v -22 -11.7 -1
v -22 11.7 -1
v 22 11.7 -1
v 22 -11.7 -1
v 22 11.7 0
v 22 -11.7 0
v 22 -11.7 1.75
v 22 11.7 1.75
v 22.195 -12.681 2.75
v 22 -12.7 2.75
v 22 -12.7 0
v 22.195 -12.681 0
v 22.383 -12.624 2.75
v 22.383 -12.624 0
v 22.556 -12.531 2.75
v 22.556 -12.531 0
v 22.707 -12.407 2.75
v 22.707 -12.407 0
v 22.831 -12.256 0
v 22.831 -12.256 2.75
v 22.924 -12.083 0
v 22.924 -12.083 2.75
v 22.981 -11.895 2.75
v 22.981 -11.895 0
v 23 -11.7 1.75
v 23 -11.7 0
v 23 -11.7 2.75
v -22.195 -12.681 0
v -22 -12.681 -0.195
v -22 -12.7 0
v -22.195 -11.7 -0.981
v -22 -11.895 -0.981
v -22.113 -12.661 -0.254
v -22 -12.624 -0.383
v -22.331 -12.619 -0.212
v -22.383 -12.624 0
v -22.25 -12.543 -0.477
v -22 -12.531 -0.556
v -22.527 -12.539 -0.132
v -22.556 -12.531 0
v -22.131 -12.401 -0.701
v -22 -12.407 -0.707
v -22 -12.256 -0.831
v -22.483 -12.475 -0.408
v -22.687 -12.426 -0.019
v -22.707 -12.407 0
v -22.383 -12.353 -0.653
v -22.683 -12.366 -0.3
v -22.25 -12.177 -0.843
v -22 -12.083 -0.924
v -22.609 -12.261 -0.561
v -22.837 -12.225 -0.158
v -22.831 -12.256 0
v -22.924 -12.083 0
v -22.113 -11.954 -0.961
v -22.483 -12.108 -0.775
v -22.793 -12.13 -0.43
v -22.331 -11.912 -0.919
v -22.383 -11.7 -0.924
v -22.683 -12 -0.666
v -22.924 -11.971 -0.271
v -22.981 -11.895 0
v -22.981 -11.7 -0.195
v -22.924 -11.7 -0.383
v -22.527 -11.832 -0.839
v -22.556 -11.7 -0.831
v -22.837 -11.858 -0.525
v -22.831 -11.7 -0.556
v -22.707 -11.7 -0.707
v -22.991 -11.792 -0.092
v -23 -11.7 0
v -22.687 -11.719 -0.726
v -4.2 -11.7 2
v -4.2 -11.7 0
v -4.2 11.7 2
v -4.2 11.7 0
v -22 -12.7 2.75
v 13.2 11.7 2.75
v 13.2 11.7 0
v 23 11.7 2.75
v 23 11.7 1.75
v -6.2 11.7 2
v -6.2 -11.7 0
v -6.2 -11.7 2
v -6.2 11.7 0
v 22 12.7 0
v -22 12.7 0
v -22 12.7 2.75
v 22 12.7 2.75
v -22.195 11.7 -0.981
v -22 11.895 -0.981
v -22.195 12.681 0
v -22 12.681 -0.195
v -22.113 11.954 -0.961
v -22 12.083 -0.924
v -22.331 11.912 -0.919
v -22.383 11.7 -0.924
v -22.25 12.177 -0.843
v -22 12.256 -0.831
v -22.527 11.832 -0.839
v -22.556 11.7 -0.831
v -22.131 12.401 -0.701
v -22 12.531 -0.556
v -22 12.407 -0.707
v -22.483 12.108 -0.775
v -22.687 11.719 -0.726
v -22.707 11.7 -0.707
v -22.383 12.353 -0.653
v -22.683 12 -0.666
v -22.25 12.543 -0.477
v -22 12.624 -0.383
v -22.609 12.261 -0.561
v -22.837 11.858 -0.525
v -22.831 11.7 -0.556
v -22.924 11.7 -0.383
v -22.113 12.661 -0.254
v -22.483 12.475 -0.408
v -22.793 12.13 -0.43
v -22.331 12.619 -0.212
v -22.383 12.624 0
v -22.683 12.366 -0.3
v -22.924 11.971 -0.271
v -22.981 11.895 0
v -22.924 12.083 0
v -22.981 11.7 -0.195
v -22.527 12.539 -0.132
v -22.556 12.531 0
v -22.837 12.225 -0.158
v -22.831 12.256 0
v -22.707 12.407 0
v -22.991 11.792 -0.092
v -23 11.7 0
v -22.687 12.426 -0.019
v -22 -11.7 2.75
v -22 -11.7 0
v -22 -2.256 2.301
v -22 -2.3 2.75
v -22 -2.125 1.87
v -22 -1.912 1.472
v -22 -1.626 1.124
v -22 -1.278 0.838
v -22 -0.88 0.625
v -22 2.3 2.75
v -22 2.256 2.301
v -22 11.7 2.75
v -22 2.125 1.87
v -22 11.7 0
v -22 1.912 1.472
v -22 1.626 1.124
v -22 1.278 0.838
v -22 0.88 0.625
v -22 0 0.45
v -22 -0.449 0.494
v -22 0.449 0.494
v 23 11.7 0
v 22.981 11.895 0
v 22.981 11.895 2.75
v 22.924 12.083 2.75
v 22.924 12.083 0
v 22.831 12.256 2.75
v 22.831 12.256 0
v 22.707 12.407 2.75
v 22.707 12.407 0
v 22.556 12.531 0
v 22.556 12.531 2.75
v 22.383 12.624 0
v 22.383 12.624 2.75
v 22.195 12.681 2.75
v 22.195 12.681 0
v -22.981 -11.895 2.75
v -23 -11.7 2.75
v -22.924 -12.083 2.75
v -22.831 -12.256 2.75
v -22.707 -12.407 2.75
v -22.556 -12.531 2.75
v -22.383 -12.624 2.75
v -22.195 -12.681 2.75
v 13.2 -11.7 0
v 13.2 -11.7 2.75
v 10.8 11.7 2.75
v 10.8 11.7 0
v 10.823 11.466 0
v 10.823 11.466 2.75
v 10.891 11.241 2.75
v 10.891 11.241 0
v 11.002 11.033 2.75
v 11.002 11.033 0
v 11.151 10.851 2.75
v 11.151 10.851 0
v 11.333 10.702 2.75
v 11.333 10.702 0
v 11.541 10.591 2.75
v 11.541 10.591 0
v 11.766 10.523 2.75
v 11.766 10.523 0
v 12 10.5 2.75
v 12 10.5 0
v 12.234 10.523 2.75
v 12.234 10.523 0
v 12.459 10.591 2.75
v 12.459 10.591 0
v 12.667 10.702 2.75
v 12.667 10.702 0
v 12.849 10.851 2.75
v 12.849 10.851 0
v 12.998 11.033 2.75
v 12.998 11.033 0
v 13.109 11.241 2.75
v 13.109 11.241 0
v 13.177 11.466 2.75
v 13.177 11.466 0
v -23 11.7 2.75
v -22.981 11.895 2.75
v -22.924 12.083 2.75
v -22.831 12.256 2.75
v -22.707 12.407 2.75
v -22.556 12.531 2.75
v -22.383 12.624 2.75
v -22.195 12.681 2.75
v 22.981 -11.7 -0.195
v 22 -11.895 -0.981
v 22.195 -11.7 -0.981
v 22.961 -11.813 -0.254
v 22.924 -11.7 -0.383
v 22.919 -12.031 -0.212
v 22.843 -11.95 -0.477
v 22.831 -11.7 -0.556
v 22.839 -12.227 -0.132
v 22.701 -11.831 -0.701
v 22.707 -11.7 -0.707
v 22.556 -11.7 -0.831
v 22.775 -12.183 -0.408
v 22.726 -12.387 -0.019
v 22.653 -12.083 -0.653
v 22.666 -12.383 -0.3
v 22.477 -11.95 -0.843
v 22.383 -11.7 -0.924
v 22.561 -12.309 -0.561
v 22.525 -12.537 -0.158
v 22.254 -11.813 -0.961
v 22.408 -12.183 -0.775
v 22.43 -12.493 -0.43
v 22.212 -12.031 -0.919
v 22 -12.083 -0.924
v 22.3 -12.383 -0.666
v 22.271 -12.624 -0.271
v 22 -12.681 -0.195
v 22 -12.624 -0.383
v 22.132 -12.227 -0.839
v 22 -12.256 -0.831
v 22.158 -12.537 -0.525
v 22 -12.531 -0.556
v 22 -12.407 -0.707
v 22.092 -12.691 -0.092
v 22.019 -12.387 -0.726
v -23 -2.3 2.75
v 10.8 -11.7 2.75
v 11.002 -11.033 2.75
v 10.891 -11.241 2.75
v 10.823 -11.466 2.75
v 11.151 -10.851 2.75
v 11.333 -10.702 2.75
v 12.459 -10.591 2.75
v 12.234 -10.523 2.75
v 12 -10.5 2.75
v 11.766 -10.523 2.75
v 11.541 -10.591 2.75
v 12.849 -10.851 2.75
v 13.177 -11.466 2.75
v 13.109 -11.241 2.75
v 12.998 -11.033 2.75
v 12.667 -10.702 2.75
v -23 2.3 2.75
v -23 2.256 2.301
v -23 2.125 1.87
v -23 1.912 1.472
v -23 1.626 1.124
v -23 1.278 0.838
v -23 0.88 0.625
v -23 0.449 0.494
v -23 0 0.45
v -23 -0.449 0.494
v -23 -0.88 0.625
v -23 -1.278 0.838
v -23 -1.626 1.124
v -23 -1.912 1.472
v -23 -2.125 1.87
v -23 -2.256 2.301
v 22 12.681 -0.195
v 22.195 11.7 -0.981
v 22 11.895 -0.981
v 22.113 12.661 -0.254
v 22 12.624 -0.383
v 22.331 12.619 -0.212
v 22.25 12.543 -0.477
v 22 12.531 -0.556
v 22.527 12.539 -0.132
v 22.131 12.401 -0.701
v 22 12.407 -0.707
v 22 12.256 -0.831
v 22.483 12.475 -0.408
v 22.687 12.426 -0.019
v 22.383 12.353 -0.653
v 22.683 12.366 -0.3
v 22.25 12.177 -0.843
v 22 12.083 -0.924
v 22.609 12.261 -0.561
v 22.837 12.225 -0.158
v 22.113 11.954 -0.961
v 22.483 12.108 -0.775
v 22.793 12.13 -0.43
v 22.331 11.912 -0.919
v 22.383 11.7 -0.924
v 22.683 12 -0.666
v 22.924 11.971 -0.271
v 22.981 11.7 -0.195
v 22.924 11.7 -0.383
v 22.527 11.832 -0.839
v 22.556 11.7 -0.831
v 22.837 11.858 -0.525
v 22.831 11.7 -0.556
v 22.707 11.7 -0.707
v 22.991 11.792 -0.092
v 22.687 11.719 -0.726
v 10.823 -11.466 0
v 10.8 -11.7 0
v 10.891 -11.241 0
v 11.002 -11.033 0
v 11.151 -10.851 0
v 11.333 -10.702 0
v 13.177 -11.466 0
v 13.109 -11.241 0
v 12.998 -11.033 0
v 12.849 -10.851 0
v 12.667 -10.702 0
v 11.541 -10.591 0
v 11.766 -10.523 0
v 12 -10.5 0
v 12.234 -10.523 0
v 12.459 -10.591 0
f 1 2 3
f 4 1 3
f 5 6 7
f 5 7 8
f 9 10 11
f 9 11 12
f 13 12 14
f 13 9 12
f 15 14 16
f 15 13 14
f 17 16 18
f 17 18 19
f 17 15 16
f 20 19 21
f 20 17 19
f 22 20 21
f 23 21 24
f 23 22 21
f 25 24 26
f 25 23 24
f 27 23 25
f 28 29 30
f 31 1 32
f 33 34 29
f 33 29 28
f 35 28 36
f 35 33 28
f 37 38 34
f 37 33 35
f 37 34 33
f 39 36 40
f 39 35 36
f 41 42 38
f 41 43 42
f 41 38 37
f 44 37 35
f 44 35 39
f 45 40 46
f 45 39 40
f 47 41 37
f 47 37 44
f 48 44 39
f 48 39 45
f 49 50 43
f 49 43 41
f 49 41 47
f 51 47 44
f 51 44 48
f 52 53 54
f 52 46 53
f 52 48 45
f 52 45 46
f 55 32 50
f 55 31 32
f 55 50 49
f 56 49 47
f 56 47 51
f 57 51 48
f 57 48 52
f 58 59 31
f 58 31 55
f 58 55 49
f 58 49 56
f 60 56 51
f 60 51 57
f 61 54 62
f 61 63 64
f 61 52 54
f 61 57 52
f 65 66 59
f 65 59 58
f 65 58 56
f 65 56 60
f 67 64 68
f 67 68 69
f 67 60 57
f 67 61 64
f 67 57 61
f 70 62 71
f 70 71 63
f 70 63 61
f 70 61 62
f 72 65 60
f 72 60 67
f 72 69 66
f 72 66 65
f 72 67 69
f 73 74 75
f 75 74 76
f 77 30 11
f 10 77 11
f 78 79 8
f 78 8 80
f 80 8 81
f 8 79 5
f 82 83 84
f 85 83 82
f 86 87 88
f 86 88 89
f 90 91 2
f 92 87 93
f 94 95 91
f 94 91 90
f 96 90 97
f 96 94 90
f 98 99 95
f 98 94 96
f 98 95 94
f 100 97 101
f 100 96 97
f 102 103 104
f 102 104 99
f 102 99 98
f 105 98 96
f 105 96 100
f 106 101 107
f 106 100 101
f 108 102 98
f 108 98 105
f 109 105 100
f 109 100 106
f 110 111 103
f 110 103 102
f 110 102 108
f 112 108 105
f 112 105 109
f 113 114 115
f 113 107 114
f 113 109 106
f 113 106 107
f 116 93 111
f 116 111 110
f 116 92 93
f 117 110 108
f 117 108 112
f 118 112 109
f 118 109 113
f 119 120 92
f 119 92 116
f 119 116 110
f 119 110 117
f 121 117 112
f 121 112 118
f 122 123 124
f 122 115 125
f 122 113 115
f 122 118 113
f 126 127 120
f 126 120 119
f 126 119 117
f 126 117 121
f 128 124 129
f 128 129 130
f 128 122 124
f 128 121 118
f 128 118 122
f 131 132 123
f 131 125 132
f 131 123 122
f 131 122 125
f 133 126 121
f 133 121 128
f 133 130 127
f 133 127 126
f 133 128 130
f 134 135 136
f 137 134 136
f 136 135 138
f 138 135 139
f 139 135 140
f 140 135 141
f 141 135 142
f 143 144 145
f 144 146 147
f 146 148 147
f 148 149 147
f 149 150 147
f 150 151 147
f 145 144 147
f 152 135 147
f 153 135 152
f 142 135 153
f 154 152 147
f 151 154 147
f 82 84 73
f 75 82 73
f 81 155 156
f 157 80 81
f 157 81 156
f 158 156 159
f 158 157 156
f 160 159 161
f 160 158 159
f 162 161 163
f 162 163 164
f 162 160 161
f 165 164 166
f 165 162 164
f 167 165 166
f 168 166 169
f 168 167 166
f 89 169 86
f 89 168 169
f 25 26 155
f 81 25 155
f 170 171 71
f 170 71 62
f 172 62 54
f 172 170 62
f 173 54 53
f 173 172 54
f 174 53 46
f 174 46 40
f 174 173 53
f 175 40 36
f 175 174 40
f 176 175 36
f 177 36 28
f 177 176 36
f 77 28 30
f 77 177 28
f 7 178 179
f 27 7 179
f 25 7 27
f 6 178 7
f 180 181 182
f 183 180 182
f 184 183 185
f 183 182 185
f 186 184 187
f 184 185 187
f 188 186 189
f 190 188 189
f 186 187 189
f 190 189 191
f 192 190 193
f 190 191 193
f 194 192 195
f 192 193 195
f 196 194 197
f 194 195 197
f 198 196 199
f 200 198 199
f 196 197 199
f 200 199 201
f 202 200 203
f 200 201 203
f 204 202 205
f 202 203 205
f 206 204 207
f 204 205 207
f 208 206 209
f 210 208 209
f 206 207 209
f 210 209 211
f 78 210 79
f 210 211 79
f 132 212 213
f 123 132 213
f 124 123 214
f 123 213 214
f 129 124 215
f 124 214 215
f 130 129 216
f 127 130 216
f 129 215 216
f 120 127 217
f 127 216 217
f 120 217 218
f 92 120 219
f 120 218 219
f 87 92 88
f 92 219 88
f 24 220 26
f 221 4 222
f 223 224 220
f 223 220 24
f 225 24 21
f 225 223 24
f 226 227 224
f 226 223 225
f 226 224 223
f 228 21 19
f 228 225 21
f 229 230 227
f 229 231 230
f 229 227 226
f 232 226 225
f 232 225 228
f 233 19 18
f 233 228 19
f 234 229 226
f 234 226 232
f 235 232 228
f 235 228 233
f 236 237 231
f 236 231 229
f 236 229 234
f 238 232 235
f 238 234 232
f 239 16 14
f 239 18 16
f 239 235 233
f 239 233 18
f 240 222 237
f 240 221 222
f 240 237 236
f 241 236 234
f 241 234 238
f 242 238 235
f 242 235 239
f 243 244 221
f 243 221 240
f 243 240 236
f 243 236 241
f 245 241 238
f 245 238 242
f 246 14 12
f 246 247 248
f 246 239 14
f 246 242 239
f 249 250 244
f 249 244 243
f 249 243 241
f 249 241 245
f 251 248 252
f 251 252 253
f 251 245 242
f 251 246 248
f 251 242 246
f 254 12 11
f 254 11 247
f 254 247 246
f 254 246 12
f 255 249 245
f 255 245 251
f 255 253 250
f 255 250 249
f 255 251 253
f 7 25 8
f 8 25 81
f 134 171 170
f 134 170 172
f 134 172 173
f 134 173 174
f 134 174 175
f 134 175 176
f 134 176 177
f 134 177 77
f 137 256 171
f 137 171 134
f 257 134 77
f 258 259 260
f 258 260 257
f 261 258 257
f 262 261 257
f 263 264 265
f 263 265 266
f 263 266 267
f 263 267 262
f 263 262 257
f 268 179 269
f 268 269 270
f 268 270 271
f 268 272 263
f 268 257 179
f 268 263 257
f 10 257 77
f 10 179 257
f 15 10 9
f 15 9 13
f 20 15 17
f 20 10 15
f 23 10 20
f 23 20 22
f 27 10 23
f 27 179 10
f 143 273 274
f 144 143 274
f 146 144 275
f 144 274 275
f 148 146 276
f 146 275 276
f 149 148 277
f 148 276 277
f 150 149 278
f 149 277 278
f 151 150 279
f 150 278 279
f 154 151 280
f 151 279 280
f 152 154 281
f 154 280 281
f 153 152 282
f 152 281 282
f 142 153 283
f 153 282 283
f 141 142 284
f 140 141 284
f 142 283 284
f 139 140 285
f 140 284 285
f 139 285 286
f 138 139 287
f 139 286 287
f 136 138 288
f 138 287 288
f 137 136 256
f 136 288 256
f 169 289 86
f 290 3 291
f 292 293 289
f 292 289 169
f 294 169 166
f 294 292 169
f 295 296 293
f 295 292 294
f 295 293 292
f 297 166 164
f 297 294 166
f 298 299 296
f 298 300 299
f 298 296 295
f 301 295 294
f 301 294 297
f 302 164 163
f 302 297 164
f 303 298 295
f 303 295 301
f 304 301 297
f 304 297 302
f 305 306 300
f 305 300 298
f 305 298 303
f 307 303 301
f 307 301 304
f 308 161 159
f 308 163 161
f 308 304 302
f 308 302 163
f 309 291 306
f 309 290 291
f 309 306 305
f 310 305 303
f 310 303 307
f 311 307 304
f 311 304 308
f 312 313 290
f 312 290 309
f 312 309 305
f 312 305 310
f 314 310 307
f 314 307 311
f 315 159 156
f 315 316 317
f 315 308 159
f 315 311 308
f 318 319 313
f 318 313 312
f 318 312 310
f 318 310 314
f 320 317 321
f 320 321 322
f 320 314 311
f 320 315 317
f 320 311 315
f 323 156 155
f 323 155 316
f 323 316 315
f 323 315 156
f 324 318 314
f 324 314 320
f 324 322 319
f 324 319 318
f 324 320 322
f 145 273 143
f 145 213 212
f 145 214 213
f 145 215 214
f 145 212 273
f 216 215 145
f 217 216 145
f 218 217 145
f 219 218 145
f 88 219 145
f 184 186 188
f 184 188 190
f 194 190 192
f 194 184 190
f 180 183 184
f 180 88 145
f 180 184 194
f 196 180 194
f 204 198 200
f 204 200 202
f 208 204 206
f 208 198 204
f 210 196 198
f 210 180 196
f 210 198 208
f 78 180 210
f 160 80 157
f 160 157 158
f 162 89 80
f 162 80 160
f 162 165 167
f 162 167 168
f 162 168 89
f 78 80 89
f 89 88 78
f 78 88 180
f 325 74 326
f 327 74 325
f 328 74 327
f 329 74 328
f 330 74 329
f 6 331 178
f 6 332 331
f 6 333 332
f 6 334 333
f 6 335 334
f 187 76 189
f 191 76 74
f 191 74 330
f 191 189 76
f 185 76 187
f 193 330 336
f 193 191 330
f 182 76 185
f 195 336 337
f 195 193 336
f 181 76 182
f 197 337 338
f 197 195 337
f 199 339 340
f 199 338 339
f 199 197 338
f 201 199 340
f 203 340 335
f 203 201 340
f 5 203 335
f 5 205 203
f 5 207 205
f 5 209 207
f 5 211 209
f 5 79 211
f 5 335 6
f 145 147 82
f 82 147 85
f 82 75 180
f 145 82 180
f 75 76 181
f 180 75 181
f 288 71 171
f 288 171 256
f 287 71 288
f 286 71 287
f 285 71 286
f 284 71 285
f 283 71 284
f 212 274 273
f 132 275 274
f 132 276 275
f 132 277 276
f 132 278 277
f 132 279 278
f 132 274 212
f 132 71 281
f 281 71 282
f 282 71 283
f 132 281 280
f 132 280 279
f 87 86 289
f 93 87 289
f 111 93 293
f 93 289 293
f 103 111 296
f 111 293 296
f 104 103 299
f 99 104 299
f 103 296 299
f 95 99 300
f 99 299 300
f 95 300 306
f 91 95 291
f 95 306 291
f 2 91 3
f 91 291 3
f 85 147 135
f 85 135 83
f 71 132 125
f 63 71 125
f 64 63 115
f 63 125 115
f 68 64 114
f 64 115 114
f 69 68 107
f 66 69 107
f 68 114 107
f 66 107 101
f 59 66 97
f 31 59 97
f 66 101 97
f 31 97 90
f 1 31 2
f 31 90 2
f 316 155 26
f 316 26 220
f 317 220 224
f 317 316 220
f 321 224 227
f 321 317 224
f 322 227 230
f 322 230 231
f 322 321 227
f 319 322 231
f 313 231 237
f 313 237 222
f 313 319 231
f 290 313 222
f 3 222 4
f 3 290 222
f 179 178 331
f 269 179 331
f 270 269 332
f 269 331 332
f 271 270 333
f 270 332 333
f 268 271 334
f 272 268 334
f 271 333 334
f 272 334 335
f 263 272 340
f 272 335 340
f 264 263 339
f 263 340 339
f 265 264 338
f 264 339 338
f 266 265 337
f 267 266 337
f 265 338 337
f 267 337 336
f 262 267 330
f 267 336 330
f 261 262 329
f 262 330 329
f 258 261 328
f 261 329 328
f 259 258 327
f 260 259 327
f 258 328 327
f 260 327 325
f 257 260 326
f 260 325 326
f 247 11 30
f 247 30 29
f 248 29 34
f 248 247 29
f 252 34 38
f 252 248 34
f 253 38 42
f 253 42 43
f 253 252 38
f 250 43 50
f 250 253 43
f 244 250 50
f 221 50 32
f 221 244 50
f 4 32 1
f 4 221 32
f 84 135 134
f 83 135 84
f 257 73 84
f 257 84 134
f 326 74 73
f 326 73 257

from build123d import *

# Parameters (mm, degrees)
SKETCH010_W     = 44
SKETCH010_H     = 23.4
PAD006_DEPTH    = 2.75
THICKNESS002_T  = 1
SKETCH011_W     = 23.4
SKETCH011_H     = 1
POCKET002_DEPTH = 1
SKETCH012_R     = 2.3
POCKET003_DEPTH = 1
PAD007_DEPTH    = 2.75
SKETCH014_W     = 2
SKETCH014_H     = 23.4
PAD008_DEPTH    = 2


with BuildPart() as part:
    # Sketch010 → Pad006 (new body)
    with BuildSketch(Plane.XY):
        Rectangle(SKETCH010_W, SKETCH010_H)
    extrude(amount=PAD006_DEPTH)

    # Thickness002
    thickness002_openings = [part.faces().sort_by_distance(p)[0] for p in [
        (0, 0, 2.75),
    ]]
    offset(amount=THICKNESS002_T, openings=thickness002_openings)

    # Sketch011 (on Face7 of Thickness002) → Pocket002 (cut)
    with BuildSketch(Plane.YZ.offset(23)):
        with Locations((0, 2.25)):
            Rectangle(SKETCH011_W, SKETCH011_H)
    extrude(amount=-POCKET002_DEPTH, mode=Mode.SUBTRACT)

    # Sketch012 (on Face15 of Pocket002) → Pocket003 (cut)
    with BuildSketch(Plane(origin=(-23, 0, 0), x_dir=(0, -1, 0), z_dir=(-1, 0, 0))):
        with Locations((0, 2.75)):
            Circle(SKETCH012_R)
    extrude(amount=-POCKET003_DEPTH, mode=Mode.SUBTRACT)

    # Sketch013 (on Face2 of Pocket003) → Pad007 (join)
    with BuildSketch(Plane.XY):
        with BuildLine():
            ThreePointArc((10.8, 11.7), (12, 10.5), (13.2, 11.7))
            Line((10.8, 11.7), (13.2, 11.7))
        make_face()
        with BuildLine():
            ThreePointArc((13.2, -11.7), (12, -10.5), (10.8, -11.7))
            Line((10.8, -11.7), (13.2, -11.7))
        make_face()
    extrude(amount=PAD007_DEPTH)

    # Sketch014 (on Face2 of Pad007) → Pad008 (join)
    with BuildSketch(Plane.XY):
        with Locations((-5.2, 0)):
            Rectangle(SKETCH014_W, SKETCH014_H)
    extrude(amount=PAD008_DEPTH)


solid = part.part
